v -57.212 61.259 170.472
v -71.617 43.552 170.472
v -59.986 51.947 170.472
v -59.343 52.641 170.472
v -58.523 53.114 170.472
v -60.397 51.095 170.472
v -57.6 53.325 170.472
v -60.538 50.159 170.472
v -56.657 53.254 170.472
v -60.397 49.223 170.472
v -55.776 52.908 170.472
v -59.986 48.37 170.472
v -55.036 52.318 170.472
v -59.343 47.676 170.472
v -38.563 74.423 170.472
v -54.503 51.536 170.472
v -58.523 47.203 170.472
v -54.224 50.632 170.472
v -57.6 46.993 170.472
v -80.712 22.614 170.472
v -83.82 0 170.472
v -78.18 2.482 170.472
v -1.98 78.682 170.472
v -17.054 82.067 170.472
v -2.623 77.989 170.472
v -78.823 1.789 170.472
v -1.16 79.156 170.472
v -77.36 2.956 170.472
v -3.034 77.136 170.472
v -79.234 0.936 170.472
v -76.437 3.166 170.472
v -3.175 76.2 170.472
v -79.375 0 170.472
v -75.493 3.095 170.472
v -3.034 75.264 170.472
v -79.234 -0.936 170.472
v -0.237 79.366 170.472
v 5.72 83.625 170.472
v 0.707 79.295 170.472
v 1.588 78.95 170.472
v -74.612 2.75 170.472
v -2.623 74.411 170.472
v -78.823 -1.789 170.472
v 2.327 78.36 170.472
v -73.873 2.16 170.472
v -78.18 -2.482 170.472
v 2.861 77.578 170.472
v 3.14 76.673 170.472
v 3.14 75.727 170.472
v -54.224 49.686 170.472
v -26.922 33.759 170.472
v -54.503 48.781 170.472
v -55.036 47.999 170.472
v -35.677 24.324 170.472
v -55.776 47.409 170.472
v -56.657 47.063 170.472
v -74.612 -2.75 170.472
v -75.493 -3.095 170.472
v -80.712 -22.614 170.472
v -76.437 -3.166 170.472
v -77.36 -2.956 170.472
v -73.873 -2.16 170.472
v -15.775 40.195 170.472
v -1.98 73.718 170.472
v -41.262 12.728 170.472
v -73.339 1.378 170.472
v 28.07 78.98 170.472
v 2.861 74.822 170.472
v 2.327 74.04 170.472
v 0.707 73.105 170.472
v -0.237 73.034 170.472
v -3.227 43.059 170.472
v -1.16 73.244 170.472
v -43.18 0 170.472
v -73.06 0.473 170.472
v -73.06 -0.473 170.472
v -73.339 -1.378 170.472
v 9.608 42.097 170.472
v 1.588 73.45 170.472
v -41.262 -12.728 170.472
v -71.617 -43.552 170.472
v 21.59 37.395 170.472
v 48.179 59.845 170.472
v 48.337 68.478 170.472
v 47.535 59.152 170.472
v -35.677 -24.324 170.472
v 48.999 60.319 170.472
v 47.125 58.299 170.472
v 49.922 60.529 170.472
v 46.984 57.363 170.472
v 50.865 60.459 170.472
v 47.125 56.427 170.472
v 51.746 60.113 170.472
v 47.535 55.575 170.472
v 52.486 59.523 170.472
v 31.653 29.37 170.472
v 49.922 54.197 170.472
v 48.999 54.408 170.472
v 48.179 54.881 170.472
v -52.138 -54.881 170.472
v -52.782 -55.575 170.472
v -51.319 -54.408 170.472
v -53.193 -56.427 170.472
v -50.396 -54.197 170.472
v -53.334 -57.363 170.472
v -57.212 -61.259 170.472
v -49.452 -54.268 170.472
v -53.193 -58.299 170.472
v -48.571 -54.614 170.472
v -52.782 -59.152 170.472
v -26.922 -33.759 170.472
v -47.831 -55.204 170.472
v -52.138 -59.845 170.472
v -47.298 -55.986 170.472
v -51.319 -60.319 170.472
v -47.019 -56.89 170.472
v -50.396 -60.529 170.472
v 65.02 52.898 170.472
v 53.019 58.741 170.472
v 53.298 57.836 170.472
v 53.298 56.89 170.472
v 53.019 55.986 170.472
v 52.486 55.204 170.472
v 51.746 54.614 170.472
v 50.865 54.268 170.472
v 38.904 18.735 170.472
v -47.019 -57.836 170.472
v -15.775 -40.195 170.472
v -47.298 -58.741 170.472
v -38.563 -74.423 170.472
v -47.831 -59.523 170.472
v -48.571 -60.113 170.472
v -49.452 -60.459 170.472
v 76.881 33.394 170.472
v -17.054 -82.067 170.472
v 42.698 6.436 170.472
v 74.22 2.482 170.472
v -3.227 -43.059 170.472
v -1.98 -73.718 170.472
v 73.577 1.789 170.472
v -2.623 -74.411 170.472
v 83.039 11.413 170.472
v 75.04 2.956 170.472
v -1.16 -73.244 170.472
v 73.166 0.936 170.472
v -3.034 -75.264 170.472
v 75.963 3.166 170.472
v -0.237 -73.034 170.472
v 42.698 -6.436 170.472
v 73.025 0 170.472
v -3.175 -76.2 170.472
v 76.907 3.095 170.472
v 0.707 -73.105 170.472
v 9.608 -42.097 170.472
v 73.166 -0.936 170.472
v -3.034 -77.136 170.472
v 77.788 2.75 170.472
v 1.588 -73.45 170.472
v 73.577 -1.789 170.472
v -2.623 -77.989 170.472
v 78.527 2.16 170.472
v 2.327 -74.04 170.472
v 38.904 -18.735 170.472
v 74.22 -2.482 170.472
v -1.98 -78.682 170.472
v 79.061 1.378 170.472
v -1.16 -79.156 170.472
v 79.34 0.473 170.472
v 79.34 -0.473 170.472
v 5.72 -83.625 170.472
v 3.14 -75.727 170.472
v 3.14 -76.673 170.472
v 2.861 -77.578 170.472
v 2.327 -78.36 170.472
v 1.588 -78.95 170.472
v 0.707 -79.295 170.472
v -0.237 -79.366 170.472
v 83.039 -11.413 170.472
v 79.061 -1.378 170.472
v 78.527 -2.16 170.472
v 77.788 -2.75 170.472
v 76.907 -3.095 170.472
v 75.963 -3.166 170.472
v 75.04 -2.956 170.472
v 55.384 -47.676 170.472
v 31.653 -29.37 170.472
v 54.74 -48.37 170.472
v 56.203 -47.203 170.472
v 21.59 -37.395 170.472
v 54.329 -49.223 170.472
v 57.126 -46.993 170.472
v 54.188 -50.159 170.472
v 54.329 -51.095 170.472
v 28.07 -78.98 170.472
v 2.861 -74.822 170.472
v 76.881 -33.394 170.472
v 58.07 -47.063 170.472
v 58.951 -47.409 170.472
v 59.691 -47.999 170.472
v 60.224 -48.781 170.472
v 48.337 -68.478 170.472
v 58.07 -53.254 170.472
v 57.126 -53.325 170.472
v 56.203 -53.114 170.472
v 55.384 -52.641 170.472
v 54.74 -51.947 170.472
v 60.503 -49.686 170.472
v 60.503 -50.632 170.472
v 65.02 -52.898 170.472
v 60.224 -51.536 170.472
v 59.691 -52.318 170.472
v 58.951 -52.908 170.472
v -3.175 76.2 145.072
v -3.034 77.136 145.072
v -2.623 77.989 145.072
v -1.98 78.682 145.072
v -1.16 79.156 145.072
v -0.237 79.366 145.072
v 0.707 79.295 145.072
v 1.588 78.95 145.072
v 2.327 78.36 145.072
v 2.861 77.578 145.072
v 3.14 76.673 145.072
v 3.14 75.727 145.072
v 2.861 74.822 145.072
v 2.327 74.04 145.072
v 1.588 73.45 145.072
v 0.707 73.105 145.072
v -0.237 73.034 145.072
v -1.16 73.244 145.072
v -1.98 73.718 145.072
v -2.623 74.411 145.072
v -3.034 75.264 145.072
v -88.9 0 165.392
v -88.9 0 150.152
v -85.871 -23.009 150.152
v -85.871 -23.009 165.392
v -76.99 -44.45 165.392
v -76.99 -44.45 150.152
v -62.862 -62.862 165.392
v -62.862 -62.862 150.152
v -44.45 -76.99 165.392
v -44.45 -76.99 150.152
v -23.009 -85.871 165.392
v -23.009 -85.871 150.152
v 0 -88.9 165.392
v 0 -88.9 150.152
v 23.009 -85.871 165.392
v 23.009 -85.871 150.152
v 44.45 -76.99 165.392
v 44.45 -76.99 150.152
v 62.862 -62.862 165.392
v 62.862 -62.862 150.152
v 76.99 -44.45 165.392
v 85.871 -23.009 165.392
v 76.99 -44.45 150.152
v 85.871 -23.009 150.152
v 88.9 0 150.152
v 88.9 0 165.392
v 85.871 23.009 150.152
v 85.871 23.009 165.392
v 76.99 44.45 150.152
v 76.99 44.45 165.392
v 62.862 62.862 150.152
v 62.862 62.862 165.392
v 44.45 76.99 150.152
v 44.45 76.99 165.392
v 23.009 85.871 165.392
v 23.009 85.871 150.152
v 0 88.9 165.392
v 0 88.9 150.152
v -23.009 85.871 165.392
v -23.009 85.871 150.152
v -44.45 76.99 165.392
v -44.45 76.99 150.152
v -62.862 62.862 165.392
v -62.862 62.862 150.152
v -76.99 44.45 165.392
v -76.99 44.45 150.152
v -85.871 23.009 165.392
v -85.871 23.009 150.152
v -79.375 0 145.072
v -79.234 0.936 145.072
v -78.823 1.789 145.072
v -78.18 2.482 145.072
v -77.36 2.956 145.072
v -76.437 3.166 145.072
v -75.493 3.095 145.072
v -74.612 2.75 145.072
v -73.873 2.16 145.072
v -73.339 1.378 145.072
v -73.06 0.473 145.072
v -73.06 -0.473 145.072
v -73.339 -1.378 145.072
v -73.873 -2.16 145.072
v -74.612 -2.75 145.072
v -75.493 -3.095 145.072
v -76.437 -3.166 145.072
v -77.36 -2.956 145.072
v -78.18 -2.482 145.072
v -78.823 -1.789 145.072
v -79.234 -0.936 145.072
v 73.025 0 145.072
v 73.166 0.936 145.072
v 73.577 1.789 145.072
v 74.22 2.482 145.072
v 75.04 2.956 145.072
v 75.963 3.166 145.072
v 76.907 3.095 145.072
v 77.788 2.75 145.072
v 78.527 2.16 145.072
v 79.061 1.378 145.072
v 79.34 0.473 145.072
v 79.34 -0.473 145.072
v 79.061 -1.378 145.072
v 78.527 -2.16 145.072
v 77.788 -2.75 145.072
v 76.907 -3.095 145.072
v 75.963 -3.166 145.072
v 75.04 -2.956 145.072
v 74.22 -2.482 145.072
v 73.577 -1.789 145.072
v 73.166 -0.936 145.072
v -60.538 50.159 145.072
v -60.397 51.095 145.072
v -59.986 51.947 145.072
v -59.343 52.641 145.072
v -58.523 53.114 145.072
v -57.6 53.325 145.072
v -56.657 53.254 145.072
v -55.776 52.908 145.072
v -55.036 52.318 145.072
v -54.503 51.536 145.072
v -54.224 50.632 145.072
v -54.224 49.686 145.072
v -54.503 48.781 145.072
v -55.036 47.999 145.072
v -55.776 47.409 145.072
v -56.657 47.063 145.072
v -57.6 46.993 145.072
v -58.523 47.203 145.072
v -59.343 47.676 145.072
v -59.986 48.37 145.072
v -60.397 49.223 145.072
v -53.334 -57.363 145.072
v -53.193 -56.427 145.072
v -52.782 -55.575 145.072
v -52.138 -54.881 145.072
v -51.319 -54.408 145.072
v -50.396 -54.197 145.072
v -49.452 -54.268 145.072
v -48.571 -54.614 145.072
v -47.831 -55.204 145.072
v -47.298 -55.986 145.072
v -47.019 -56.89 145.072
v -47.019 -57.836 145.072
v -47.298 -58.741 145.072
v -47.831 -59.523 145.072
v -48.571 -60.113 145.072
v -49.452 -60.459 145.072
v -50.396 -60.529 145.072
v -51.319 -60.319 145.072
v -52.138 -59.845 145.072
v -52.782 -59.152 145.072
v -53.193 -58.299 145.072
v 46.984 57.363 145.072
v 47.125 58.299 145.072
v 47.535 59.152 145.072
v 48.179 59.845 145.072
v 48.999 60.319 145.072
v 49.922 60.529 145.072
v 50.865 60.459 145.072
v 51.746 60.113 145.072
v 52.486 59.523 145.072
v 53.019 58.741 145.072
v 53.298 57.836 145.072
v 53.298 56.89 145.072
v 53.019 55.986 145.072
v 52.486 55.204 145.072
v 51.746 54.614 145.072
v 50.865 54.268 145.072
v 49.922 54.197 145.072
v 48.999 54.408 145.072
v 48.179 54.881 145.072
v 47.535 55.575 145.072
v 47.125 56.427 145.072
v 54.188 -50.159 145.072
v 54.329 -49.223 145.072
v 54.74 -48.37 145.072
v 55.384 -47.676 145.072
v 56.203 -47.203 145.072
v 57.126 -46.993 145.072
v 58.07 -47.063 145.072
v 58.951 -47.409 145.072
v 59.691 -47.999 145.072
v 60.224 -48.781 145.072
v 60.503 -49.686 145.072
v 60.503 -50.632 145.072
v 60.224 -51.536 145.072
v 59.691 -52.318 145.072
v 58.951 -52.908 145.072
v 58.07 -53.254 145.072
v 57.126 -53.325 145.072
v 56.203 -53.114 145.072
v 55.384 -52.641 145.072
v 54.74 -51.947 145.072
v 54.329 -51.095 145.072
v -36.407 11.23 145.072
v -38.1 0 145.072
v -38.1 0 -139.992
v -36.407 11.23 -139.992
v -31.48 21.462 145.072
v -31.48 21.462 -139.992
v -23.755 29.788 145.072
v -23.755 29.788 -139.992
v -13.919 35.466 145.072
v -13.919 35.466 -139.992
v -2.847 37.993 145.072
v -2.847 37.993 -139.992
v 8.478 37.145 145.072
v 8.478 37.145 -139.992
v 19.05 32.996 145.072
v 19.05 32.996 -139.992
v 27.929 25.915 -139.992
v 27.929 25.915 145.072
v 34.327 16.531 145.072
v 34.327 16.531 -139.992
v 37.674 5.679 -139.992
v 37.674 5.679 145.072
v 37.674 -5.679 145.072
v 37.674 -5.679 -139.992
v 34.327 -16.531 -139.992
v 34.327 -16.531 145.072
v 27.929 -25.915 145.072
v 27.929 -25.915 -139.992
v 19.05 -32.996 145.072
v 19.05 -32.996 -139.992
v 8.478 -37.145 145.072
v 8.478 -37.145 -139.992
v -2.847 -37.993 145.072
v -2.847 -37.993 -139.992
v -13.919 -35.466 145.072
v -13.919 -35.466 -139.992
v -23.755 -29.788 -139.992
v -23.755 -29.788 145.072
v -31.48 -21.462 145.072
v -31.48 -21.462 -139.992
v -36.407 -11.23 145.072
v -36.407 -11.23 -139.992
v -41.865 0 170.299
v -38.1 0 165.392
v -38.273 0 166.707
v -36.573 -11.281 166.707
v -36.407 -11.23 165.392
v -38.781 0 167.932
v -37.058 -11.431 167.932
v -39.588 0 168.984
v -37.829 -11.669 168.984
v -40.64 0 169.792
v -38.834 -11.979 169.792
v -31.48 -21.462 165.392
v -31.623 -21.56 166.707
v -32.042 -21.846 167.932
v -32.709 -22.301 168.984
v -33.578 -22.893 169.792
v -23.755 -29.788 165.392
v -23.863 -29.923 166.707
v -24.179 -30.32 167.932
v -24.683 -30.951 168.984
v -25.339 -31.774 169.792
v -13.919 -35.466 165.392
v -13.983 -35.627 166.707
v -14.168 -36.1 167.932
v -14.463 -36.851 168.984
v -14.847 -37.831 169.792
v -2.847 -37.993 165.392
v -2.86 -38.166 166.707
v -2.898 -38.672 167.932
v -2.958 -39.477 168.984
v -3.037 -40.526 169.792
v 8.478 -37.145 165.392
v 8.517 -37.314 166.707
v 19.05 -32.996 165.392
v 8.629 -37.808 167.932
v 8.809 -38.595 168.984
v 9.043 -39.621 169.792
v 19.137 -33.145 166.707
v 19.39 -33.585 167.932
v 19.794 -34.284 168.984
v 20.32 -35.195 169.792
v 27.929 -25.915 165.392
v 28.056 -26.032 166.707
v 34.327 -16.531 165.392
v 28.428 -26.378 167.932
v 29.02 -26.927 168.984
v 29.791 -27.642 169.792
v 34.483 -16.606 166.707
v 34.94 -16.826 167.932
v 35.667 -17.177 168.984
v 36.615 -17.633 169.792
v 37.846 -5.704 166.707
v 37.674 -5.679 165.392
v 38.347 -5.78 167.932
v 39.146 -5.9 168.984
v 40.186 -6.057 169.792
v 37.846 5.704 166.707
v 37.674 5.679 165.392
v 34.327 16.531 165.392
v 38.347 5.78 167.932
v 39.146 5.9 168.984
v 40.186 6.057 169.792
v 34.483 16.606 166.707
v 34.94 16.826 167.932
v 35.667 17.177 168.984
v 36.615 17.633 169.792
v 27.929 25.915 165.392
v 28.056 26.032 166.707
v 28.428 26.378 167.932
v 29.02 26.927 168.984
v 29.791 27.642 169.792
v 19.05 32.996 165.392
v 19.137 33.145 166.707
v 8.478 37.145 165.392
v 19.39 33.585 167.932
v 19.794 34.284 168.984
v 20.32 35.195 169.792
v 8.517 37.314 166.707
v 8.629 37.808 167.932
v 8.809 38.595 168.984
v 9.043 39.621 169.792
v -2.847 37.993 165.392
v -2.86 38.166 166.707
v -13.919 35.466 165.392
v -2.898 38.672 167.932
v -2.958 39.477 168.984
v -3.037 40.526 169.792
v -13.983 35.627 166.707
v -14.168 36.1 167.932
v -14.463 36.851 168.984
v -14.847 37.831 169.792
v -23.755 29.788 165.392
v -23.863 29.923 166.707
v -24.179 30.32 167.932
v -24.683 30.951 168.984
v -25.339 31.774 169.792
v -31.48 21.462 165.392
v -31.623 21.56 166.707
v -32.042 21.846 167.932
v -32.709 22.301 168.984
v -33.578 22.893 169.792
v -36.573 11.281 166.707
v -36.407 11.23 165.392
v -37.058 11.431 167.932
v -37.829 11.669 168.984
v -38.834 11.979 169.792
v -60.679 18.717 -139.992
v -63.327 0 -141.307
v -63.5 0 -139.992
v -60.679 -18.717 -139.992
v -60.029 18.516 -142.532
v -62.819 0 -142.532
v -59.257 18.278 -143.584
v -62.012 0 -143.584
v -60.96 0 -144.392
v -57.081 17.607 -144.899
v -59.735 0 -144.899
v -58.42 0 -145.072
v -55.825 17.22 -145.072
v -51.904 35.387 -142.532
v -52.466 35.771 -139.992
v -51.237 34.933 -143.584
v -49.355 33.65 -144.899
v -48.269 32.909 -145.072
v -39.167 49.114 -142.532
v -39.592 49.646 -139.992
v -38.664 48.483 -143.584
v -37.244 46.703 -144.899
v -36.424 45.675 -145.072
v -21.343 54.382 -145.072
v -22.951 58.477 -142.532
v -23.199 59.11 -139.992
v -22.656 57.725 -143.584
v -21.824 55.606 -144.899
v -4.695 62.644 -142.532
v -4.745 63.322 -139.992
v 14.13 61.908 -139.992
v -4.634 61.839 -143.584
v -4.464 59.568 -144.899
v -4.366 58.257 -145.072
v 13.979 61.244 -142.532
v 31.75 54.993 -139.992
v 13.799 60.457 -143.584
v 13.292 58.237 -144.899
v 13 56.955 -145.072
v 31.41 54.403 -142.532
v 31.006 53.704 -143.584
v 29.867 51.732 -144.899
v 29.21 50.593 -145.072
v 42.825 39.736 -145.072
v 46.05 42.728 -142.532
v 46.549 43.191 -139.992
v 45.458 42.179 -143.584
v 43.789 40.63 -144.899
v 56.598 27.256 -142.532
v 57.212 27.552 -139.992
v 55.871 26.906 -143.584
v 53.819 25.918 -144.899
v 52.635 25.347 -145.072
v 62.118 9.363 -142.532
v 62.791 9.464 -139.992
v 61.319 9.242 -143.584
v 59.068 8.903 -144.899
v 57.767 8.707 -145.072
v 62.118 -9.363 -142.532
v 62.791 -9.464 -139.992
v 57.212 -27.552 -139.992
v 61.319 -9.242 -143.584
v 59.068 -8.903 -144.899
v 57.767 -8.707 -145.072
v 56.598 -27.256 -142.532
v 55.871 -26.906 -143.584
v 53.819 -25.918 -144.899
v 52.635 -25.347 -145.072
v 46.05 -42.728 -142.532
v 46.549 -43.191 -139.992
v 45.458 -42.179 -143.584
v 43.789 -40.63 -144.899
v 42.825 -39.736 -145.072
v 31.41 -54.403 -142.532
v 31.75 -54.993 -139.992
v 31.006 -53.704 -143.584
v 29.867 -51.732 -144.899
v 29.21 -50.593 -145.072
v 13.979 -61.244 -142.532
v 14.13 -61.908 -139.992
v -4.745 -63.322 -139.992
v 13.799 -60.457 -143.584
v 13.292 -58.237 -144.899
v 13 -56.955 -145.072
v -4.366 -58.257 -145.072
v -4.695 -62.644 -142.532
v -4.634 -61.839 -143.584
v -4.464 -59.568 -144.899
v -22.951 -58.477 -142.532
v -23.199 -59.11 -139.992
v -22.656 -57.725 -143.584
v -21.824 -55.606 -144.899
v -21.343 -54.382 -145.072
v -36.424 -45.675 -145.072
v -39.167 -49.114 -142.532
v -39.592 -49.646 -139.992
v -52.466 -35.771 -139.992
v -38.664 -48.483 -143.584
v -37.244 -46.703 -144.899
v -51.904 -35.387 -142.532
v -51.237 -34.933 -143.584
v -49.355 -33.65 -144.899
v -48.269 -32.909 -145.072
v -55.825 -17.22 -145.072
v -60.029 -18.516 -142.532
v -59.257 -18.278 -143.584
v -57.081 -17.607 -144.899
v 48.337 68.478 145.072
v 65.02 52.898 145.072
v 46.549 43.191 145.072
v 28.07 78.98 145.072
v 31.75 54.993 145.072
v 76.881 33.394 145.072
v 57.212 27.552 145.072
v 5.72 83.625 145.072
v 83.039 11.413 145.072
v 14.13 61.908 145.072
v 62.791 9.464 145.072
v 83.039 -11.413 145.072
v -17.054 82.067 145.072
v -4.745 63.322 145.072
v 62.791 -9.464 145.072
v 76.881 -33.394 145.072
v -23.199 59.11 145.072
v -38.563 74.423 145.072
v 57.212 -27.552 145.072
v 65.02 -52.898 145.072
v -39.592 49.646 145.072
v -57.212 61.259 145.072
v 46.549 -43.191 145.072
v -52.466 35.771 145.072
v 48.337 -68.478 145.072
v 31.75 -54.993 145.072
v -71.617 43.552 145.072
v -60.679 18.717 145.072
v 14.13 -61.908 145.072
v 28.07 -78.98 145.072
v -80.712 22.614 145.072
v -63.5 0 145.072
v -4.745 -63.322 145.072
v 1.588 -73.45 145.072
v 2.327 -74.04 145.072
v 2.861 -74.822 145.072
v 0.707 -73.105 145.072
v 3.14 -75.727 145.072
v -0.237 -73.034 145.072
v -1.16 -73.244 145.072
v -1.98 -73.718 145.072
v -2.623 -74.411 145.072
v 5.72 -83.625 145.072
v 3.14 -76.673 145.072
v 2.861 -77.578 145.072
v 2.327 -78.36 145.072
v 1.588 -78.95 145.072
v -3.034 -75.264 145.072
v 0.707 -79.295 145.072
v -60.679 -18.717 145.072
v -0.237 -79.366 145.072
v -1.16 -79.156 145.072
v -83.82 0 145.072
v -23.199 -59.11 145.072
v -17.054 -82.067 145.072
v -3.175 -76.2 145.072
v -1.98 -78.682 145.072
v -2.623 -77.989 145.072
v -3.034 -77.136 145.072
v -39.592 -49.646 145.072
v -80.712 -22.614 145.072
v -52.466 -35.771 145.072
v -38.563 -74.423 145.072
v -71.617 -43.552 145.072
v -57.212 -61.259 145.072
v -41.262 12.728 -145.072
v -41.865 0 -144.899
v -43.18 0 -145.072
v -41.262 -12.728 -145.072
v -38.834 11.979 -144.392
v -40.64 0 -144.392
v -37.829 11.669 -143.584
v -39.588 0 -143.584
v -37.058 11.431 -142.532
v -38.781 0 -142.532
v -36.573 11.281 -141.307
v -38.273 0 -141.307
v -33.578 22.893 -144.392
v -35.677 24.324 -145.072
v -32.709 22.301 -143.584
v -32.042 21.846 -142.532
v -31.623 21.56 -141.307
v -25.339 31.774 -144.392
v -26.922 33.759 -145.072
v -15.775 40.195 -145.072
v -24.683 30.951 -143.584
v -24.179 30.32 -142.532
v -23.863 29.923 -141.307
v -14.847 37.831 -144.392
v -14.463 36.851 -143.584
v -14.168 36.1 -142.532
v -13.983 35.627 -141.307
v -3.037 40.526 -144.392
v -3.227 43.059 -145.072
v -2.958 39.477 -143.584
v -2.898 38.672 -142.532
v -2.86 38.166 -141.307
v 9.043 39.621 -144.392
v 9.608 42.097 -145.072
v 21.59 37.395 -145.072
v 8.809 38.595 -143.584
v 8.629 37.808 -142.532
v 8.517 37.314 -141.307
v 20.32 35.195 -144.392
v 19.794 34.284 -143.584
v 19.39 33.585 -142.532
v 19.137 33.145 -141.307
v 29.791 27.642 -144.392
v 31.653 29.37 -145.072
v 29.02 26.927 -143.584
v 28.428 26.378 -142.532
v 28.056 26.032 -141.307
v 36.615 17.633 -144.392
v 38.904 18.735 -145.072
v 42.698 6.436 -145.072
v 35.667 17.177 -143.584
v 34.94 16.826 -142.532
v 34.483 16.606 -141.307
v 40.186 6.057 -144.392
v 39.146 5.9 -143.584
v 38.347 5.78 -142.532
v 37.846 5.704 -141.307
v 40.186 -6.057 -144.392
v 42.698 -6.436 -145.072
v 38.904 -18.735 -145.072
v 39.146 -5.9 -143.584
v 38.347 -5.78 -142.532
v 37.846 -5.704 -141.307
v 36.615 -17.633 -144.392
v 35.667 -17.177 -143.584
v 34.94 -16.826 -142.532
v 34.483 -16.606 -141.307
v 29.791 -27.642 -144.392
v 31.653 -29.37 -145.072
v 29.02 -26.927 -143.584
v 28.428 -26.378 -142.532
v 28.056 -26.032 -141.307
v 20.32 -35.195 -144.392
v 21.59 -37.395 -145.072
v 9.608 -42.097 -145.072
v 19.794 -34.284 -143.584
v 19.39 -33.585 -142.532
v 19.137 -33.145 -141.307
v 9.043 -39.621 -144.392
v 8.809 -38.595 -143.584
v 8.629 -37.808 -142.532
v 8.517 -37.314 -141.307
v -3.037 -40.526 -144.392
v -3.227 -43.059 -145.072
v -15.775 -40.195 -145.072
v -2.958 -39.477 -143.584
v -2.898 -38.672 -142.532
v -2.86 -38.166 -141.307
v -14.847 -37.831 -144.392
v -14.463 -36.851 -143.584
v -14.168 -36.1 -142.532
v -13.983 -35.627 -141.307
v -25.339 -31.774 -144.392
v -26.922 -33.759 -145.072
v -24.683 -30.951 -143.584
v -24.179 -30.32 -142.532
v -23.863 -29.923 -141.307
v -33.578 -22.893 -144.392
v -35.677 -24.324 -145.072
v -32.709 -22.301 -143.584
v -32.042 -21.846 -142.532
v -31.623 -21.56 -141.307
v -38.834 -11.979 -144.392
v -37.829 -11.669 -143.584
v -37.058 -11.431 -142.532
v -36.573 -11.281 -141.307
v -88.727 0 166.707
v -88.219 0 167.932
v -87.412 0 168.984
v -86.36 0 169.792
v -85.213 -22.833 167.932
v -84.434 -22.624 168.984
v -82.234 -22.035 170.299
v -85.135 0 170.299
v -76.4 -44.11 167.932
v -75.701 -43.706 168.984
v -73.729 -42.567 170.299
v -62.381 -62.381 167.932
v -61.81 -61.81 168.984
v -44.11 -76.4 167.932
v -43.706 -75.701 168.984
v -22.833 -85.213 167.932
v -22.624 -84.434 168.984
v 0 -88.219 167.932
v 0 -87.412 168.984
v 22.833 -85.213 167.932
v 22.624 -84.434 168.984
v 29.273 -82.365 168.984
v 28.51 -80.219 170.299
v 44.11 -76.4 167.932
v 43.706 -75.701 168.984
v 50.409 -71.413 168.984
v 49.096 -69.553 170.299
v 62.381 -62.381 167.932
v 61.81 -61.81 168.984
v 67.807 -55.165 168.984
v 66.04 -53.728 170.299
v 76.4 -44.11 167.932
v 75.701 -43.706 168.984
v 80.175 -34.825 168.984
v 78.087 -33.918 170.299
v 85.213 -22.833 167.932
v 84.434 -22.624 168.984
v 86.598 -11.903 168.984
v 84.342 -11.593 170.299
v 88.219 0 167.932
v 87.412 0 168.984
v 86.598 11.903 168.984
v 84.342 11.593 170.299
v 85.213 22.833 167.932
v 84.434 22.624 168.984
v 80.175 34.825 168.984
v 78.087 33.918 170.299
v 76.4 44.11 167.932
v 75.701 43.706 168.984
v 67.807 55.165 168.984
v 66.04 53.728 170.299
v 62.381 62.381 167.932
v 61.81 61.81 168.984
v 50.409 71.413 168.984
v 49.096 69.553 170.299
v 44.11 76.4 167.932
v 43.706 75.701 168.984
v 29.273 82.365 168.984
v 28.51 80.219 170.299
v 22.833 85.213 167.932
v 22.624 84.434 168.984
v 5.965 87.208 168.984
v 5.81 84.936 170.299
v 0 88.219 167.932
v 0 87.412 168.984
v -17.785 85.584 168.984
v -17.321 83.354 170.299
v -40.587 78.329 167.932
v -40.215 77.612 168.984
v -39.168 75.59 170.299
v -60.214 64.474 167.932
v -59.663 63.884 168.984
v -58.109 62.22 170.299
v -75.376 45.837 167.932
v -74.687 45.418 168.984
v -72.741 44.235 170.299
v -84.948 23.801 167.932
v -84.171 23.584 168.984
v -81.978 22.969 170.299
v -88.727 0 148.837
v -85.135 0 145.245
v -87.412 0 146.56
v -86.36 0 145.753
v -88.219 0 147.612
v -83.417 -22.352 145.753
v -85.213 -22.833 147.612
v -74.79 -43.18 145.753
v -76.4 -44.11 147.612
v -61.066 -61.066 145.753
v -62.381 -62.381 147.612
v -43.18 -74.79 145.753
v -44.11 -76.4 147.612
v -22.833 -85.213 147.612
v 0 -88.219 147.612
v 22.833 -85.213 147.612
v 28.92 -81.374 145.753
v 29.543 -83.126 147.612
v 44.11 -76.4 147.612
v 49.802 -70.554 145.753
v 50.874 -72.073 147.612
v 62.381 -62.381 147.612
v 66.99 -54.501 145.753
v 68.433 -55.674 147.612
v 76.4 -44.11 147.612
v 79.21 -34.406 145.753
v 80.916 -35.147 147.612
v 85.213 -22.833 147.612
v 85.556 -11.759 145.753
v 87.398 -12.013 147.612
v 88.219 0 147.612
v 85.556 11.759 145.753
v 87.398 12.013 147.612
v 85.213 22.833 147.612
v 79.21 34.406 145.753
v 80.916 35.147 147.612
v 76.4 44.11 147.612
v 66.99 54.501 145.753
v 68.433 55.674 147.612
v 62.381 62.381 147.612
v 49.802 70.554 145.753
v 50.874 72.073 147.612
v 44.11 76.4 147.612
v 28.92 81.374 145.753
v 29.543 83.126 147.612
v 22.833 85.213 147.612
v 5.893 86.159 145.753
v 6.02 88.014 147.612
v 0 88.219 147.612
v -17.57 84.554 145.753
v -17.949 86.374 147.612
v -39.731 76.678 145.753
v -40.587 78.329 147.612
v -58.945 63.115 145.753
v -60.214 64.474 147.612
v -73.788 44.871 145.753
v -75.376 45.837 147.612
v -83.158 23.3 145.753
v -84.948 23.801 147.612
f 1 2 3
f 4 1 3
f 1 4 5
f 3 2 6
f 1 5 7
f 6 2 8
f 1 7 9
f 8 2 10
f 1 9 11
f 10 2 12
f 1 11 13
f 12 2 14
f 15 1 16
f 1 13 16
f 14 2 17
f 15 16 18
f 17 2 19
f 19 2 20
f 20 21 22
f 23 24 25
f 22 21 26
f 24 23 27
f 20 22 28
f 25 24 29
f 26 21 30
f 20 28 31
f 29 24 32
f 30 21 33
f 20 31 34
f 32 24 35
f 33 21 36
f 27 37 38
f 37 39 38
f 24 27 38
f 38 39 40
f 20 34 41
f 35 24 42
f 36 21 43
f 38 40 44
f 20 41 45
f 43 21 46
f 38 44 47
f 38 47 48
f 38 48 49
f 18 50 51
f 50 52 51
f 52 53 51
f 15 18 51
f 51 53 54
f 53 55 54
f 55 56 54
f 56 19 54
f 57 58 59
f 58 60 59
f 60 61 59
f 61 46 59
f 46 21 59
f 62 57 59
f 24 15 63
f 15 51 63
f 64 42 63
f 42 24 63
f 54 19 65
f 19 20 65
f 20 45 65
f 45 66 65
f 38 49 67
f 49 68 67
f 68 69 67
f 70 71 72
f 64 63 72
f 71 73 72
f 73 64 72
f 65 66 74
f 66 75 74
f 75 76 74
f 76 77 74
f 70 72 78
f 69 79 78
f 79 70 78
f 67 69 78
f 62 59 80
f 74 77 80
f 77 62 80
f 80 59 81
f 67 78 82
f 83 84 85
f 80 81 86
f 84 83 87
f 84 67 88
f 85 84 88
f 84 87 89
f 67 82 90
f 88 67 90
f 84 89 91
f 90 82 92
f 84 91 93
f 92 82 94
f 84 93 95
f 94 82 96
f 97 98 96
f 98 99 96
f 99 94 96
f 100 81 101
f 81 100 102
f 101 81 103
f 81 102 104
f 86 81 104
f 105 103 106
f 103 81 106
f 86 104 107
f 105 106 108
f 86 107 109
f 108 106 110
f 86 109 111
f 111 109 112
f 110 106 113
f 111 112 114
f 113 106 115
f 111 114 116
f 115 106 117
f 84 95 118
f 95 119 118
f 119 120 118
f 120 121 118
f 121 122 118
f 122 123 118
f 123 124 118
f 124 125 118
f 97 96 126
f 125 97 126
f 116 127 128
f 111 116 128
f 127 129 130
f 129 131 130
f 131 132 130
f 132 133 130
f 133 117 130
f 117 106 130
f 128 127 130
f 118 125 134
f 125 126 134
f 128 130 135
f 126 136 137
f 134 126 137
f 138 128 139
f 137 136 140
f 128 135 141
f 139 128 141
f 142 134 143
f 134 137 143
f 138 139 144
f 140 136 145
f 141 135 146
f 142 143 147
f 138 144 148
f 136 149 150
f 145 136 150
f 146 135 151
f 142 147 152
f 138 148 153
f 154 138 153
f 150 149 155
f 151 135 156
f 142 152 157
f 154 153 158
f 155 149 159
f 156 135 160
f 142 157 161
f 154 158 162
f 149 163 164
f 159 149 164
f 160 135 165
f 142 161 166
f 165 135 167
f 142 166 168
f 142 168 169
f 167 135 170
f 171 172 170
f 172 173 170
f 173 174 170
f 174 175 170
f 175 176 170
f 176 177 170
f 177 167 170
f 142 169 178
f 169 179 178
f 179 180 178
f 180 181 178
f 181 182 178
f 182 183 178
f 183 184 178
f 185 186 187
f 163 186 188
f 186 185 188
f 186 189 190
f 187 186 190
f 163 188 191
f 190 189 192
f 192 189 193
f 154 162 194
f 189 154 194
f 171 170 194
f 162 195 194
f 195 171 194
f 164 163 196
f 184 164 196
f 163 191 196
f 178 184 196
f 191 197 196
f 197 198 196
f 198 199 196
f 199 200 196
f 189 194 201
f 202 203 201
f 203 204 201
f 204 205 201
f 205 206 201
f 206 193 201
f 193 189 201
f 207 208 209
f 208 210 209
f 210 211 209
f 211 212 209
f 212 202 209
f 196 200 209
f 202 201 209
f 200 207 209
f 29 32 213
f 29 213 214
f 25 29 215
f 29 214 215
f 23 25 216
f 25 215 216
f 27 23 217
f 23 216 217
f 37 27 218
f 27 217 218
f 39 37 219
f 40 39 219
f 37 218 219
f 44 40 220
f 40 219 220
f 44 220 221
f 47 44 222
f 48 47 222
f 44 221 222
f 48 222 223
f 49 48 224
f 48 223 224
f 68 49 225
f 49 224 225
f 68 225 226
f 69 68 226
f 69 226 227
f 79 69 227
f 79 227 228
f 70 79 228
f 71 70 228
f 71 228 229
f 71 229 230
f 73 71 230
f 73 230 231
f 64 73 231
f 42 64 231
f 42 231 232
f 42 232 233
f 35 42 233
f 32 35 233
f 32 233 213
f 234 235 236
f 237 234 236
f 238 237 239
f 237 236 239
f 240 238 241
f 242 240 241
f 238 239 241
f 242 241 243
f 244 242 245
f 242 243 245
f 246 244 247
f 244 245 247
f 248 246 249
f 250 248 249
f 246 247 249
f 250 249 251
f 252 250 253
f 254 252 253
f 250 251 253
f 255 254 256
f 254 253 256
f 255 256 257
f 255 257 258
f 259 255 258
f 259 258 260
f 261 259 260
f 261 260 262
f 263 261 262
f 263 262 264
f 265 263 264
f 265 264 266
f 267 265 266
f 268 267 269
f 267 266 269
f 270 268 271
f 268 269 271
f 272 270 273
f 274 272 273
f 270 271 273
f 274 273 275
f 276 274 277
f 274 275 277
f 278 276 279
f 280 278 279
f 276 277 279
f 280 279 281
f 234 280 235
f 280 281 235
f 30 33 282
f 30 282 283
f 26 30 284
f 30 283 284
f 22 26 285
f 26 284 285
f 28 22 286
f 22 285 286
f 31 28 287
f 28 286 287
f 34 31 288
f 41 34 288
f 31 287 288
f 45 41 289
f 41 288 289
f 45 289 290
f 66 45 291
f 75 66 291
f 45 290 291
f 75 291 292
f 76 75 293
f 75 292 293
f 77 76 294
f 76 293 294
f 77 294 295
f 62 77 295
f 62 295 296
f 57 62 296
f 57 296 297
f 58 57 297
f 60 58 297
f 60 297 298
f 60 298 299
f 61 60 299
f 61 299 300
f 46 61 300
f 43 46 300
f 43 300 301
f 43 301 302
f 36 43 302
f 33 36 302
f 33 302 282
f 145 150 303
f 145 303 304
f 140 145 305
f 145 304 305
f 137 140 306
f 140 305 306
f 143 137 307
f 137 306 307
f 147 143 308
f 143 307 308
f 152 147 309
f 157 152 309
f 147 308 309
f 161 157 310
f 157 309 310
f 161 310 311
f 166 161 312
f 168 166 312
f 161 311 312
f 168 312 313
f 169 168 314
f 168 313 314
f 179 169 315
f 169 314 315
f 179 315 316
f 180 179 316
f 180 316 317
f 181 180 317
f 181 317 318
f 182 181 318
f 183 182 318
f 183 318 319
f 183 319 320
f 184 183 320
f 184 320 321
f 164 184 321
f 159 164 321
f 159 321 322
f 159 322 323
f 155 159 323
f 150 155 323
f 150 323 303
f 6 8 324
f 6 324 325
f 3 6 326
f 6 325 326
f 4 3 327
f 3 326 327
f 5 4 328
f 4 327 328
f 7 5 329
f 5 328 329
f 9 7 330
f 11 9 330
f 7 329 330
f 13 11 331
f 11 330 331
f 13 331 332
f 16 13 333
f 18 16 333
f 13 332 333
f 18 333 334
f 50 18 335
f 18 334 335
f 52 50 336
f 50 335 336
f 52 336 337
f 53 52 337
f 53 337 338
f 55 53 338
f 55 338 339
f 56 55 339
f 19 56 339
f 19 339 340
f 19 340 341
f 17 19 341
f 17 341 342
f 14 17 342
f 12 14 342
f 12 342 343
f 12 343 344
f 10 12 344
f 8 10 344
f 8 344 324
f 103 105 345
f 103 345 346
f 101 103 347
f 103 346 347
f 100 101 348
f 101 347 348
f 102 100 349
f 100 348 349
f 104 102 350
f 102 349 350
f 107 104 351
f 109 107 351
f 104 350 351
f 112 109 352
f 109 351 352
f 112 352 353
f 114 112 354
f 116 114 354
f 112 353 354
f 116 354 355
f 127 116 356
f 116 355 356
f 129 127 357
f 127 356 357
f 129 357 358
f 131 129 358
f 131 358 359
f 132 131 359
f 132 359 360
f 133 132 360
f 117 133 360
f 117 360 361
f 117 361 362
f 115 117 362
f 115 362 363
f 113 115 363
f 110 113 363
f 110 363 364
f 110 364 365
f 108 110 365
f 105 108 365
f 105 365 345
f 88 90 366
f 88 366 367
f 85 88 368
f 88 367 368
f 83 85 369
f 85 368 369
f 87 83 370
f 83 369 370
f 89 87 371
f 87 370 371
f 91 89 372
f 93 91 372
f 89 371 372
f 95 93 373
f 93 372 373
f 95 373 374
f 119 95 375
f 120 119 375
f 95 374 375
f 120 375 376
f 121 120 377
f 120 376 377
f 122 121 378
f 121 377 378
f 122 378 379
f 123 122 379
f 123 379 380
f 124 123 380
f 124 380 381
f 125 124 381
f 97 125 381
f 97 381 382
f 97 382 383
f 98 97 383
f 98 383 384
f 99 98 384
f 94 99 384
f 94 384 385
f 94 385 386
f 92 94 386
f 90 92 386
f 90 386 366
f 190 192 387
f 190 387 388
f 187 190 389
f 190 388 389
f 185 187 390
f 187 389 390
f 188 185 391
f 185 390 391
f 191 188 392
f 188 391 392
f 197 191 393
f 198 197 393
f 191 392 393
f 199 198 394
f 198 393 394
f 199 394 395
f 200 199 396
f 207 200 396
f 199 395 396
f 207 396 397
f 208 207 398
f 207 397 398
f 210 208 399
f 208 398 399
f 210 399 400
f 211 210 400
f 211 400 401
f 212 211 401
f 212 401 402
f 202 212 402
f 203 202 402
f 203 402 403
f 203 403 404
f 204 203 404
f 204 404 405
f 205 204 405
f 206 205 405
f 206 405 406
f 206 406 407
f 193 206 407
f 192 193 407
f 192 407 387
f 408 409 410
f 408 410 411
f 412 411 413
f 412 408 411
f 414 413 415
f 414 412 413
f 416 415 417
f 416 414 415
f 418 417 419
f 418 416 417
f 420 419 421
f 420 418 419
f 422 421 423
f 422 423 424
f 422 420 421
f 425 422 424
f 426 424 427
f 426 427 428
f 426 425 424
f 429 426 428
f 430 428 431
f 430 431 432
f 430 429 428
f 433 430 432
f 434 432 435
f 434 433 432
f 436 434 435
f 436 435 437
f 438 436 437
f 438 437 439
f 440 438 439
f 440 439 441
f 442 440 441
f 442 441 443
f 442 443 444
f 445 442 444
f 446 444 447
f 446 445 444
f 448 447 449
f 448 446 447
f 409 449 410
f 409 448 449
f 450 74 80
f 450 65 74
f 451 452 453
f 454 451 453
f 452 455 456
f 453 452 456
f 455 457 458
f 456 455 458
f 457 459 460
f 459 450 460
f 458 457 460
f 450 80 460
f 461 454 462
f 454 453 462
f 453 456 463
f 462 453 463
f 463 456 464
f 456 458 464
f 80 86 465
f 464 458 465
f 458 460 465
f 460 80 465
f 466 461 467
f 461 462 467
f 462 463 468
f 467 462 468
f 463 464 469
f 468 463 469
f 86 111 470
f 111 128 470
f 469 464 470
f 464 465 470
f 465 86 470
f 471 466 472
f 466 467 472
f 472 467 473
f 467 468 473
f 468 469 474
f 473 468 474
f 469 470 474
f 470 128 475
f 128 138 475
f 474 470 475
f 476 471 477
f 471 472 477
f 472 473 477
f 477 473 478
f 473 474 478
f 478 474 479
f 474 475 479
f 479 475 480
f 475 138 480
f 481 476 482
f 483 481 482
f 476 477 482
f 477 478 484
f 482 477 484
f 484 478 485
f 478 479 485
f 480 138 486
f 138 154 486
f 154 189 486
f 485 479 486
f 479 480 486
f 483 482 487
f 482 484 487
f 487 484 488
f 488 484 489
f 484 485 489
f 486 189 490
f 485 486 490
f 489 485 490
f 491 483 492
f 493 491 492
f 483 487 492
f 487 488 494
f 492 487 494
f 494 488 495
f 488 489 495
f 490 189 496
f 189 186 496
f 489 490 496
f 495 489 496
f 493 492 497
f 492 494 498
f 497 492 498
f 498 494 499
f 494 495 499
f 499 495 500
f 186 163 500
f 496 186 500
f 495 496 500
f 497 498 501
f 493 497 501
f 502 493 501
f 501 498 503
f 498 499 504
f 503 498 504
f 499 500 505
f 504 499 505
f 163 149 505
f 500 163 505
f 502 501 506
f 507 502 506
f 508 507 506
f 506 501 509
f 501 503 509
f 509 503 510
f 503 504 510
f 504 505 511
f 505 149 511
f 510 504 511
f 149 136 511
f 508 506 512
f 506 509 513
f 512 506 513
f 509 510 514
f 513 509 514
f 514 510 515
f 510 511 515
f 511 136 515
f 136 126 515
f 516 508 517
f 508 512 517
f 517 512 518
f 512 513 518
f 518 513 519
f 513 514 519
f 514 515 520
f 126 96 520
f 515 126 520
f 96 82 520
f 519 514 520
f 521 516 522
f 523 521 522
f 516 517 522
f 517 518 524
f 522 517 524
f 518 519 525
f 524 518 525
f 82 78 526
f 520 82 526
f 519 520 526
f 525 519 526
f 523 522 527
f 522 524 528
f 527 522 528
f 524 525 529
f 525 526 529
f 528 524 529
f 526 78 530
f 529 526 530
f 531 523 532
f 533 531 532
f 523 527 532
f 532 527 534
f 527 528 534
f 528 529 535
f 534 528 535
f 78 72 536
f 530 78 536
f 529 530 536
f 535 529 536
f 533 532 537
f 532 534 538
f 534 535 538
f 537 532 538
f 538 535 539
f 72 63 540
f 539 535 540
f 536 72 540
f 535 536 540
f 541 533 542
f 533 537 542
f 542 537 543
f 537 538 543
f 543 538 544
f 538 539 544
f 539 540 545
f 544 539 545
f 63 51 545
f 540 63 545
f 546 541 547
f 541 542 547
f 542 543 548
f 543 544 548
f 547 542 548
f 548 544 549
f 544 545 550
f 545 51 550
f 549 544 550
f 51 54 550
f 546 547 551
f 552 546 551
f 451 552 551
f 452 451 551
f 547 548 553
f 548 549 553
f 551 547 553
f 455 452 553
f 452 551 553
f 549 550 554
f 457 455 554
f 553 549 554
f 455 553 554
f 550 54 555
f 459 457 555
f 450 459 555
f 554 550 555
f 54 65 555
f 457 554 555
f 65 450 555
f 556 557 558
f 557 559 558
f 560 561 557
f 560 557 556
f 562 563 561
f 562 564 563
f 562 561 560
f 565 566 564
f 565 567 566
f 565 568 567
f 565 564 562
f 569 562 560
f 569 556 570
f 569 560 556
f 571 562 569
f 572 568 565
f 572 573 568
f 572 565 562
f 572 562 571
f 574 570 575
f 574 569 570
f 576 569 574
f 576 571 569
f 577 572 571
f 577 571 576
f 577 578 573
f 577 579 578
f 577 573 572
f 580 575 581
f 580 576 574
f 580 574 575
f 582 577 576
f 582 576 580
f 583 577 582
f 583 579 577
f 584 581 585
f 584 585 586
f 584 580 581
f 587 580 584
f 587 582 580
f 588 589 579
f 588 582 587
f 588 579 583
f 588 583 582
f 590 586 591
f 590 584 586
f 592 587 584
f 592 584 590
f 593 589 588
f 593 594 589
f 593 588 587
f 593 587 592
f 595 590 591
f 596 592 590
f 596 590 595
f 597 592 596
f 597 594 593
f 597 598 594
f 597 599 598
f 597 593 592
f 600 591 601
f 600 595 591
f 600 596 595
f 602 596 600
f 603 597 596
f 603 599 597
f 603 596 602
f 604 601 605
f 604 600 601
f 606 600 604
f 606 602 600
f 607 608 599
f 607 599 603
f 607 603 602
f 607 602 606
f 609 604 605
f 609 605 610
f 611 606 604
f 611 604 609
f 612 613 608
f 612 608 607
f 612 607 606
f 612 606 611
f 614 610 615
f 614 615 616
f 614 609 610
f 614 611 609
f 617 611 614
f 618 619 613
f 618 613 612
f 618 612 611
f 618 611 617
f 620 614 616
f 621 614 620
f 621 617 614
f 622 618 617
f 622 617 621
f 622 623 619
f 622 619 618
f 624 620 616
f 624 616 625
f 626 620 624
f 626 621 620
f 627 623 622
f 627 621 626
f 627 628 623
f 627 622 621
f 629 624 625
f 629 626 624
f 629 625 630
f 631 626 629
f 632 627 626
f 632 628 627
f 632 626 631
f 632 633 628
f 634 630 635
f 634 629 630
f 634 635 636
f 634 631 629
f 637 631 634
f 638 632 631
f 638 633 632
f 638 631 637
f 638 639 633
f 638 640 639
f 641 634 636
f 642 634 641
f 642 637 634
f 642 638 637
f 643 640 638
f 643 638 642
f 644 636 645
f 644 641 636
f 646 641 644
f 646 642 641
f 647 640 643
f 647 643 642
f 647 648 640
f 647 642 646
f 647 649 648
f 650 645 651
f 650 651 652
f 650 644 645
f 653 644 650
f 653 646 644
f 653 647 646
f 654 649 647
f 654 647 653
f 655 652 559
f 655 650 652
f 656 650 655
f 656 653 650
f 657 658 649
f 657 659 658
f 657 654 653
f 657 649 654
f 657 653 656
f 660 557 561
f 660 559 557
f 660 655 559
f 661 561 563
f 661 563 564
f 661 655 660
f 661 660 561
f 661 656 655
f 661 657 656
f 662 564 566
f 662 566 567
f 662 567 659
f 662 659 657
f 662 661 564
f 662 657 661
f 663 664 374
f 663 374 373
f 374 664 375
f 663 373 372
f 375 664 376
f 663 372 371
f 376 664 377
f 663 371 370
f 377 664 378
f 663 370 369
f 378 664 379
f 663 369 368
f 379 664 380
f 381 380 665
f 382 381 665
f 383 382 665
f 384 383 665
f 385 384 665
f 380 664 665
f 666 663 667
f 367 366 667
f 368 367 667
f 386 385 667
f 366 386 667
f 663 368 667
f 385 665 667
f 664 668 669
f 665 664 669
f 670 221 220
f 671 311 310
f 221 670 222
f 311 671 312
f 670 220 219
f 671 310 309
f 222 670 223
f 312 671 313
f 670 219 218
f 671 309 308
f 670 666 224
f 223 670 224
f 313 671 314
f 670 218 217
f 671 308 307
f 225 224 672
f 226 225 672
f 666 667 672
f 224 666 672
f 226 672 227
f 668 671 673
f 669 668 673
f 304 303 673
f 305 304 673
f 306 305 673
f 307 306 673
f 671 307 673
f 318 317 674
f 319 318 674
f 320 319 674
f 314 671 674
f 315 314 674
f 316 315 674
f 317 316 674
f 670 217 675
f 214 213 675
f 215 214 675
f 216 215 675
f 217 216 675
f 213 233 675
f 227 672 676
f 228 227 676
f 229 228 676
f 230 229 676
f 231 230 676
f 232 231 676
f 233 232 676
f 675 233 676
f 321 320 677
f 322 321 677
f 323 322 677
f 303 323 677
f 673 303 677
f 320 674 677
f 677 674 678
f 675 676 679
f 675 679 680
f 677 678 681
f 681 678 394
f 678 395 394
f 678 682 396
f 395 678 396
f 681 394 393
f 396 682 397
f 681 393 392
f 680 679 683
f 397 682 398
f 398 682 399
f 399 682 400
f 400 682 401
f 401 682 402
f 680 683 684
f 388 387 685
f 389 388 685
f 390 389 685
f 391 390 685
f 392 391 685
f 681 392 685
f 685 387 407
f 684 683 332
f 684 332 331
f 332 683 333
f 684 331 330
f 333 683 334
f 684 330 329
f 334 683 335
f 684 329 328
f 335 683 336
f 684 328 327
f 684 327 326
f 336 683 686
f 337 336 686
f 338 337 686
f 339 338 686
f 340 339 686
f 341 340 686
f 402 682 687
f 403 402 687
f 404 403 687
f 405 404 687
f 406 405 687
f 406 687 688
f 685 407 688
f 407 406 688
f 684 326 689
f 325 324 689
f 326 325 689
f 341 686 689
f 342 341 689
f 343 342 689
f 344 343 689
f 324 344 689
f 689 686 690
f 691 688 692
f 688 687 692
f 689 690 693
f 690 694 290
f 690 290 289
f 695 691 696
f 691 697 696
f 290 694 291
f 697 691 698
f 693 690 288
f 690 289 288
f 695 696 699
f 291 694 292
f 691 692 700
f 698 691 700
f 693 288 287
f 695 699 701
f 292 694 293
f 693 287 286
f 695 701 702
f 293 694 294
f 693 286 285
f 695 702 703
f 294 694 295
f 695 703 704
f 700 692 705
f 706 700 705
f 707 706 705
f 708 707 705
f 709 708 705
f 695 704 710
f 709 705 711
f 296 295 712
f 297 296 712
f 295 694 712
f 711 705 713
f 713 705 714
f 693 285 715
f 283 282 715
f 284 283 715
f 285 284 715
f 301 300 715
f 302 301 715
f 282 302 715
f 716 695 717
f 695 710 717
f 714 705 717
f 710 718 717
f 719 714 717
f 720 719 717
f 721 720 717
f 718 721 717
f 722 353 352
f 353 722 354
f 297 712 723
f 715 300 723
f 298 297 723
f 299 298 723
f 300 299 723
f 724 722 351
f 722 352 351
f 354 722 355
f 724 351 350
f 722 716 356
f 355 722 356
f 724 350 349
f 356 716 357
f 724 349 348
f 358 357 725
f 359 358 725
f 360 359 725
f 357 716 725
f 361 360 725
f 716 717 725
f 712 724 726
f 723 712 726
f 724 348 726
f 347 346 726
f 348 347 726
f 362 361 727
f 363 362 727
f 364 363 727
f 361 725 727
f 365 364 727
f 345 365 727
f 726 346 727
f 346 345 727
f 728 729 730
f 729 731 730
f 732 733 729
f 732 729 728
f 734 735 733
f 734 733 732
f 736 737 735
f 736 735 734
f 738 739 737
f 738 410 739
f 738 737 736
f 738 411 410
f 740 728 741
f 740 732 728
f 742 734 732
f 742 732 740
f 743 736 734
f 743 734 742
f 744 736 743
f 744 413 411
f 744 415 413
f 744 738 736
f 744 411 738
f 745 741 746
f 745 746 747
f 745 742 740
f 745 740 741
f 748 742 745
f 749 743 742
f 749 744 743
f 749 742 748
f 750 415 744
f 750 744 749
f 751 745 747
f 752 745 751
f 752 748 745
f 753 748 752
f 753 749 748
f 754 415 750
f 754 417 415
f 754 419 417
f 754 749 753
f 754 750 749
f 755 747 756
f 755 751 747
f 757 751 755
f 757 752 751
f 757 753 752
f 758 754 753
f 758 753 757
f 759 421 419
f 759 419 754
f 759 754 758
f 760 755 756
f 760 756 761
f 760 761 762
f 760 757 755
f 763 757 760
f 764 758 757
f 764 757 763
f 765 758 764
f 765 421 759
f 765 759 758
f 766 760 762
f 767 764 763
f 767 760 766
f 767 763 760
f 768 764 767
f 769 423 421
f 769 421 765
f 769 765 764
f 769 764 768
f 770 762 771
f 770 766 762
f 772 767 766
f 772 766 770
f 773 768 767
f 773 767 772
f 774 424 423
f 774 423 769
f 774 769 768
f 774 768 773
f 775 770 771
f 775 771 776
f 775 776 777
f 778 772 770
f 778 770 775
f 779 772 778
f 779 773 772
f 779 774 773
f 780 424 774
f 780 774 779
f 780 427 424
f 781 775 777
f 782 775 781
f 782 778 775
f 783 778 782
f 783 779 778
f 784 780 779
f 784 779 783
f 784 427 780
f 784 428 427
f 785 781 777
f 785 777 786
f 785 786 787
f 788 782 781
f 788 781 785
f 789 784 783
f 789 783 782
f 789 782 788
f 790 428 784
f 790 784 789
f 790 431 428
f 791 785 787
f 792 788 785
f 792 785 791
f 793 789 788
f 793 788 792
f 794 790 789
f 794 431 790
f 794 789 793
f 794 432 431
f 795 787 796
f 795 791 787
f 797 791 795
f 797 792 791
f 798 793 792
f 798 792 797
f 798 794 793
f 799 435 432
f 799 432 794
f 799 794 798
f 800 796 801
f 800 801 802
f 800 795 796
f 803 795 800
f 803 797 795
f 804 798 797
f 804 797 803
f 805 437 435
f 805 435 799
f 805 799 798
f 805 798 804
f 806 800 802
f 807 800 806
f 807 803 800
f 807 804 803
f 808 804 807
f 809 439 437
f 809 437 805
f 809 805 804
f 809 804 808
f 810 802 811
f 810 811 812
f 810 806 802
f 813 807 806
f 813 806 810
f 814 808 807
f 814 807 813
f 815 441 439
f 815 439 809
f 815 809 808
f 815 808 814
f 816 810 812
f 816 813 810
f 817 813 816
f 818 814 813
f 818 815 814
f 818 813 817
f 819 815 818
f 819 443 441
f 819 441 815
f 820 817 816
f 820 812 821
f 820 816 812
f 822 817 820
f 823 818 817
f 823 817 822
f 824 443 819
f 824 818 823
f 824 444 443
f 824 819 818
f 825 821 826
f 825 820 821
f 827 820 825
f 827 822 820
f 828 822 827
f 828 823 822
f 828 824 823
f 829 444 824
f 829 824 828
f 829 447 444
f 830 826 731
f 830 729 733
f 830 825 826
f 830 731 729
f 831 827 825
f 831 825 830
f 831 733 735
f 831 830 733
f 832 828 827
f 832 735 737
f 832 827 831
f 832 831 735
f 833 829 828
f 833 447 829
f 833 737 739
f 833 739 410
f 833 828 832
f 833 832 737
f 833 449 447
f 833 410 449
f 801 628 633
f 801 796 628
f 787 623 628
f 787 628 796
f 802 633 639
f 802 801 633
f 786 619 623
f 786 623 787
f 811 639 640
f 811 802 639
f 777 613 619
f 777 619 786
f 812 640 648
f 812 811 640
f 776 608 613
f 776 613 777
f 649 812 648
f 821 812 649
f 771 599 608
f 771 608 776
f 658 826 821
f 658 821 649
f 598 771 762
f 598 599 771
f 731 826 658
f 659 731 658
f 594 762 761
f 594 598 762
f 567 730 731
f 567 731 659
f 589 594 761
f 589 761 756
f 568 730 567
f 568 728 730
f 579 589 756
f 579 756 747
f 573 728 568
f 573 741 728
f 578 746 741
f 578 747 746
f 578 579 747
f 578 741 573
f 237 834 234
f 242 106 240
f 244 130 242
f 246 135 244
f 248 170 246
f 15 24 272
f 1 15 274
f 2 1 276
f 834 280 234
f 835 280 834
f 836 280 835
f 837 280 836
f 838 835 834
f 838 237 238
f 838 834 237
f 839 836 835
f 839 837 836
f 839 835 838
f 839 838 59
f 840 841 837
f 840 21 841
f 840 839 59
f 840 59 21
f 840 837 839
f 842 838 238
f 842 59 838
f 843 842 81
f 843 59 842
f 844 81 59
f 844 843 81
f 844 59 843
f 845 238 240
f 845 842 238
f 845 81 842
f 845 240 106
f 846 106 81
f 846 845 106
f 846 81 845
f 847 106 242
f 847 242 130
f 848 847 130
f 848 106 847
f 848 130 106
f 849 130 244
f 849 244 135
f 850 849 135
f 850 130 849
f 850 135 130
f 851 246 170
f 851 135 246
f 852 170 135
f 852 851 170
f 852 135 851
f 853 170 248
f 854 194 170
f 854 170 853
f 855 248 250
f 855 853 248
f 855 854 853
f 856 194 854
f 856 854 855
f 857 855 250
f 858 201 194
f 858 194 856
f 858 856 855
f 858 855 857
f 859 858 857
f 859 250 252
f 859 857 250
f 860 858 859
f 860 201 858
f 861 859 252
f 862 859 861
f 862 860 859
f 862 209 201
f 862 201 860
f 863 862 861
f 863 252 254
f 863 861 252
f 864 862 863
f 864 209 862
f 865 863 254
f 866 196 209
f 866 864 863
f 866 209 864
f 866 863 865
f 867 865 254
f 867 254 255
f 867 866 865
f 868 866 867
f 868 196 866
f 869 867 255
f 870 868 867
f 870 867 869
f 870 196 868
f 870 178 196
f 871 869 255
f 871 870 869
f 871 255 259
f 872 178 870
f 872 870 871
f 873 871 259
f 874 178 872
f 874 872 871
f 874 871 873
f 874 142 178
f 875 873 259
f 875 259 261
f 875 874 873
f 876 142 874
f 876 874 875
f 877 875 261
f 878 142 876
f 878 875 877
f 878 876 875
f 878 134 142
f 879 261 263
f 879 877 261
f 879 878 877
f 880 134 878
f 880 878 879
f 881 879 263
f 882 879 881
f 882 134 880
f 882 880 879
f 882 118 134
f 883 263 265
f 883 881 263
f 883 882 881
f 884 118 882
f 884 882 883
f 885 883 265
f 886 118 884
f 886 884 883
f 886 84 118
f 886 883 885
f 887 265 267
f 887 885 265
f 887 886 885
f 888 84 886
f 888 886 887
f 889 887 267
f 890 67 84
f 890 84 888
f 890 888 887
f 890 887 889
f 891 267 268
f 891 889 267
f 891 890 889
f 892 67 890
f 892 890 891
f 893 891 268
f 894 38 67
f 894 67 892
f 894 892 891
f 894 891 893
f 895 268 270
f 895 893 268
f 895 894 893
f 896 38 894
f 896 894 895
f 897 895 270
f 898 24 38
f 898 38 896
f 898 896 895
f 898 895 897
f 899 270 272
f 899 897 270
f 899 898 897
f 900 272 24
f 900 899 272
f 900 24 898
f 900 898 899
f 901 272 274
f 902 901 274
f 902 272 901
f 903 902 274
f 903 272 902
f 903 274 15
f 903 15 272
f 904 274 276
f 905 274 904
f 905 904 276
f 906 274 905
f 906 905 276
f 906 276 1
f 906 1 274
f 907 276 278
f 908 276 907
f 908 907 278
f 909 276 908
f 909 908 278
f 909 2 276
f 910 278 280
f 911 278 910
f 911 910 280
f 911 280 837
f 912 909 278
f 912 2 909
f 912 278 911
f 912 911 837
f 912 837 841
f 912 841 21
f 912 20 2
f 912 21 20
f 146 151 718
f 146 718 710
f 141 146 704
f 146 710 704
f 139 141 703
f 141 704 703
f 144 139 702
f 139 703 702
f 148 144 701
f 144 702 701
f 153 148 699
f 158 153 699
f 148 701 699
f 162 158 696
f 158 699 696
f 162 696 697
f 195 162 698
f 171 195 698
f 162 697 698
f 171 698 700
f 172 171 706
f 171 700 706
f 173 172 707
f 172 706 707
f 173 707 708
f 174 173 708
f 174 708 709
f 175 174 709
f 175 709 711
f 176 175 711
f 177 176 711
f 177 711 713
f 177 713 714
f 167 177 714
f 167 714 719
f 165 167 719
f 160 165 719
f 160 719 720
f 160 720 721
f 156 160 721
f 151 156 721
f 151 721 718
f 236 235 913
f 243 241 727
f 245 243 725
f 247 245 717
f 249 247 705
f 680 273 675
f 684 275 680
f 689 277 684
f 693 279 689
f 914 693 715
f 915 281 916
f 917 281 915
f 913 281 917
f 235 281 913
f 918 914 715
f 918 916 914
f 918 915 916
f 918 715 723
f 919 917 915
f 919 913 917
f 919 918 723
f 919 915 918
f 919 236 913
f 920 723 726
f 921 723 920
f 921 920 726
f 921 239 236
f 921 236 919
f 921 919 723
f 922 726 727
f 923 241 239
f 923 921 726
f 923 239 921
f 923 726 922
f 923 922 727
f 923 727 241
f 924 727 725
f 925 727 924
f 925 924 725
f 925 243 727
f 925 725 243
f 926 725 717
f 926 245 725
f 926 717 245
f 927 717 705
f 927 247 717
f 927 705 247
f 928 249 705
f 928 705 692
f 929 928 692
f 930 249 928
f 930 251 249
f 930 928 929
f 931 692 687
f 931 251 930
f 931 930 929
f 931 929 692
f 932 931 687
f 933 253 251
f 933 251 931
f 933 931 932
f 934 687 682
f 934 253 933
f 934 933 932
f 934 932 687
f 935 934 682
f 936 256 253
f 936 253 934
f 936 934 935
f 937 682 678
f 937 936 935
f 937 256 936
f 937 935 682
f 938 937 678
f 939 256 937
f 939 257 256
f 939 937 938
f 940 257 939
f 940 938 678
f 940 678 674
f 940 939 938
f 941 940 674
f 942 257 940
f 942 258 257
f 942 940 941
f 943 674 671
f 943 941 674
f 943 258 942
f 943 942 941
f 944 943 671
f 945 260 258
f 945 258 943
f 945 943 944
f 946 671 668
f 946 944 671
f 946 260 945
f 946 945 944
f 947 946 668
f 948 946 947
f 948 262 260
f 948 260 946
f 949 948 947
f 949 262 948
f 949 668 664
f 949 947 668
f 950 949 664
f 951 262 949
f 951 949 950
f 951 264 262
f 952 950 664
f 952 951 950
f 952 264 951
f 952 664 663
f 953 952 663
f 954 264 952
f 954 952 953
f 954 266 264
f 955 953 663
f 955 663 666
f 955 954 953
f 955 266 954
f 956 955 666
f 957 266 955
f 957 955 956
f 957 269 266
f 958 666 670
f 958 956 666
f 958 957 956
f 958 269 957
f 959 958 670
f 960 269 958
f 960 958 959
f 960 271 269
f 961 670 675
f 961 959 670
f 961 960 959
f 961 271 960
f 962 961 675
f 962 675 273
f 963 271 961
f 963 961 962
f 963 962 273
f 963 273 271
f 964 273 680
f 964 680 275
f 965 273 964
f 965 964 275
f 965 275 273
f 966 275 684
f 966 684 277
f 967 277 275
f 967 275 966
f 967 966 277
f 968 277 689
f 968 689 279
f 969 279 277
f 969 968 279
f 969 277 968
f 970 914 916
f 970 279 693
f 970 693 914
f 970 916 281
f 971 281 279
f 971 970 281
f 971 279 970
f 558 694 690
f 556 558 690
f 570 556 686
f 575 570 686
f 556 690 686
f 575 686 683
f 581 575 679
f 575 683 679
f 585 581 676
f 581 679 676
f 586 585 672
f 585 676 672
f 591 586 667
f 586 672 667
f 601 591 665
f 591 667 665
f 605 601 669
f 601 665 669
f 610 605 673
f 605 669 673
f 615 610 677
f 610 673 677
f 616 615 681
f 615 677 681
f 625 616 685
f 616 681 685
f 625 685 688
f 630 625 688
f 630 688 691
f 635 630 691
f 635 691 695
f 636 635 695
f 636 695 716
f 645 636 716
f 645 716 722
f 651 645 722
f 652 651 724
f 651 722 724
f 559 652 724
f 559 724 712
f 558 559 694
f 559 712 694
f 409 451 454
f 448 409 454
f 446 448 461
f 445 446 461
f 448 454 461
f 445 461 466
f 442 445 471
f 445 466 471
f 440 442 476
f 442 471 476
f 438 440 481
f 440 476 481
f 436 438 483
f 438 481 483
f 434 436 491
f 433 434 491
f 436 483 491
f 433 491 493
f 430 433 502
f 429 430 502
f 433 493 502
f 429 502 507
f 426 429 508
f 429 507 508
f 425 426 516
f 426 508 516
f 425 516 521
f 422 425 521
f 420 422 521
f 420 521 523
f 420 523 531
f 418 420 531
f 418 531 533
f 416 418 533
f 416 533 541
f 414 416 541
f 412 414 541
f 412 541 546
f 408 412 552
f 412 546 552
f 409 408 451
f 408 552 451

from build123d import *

# Parameters (mm, degrees)
F0_W  = 25.4
F0_H  = 290.144244
F3_R  = 5.08
F4_R  = 5.08
F7_D  = 6.35
F9_D  = 6.35
F11_D = 6.35


with BuildPart() as f1:
    # F0 (on Front) → F1 (revolve)
    with BuildSketch(Plane.XZ):
        Polygon((-63.5, 145.072122), (-38.1, 145.072122), (-38.1, 170.472122), (-88.9, 170.472122), (-88.9, 145.072122), align=None)
    revolve(axis=Axis((0, 0, 157.772122), (0, 0, 1)))

    # F0 (on Front) → F2 (revolve)
    with BuildSketch(Plane.XZ):
        with Locations((-50.8, 0)):
            Rectangle(F0_W, F0_H)
    revolve(axis=Axis((0, 0, 0), (0, 0, -1)))

    # F3
    f3_edges = [f1.edges().sort_by_distance(p)[0] for p in [
        (88.9, 0, 170.472122),
        (88.9, 0, 145.072122),
        (38.1, 0, 170.472122),
        (63.5, 0, -145.072122),
    ]]
    fillet(f3_edges, radius=F3_R)

    # F4
    f4_edges = [f1.edges().sort_by_distance(p)[0] for p in [
        (38.1, 0, -145.072122),
    ]]
    fillet(f4_edges, radius=F4_R)

    # F7 (through all)
    with Locations(Plane.XY.offset(170.472122)):
        with Locations((-76.2, 0), (0, 76.2)):
            Hole(F7_D / 2)

    # F9 (through all)
    with Locations(Plane.XY.offset(170.472122)):
        with Locations((0, -76.2), (76.2, 0)):
            Hole(F9_D / 2)

    # F11 (through all)
    with Locations(Plane.XY.offset(170.472122)):
        with Locations((-57.363182, 50.158802), (50.158802, 57.363182), (57.363182, -50.158802), (-50.158802, -57.363182)):
            Hole(F11_D / 2)


solid = f1.part
